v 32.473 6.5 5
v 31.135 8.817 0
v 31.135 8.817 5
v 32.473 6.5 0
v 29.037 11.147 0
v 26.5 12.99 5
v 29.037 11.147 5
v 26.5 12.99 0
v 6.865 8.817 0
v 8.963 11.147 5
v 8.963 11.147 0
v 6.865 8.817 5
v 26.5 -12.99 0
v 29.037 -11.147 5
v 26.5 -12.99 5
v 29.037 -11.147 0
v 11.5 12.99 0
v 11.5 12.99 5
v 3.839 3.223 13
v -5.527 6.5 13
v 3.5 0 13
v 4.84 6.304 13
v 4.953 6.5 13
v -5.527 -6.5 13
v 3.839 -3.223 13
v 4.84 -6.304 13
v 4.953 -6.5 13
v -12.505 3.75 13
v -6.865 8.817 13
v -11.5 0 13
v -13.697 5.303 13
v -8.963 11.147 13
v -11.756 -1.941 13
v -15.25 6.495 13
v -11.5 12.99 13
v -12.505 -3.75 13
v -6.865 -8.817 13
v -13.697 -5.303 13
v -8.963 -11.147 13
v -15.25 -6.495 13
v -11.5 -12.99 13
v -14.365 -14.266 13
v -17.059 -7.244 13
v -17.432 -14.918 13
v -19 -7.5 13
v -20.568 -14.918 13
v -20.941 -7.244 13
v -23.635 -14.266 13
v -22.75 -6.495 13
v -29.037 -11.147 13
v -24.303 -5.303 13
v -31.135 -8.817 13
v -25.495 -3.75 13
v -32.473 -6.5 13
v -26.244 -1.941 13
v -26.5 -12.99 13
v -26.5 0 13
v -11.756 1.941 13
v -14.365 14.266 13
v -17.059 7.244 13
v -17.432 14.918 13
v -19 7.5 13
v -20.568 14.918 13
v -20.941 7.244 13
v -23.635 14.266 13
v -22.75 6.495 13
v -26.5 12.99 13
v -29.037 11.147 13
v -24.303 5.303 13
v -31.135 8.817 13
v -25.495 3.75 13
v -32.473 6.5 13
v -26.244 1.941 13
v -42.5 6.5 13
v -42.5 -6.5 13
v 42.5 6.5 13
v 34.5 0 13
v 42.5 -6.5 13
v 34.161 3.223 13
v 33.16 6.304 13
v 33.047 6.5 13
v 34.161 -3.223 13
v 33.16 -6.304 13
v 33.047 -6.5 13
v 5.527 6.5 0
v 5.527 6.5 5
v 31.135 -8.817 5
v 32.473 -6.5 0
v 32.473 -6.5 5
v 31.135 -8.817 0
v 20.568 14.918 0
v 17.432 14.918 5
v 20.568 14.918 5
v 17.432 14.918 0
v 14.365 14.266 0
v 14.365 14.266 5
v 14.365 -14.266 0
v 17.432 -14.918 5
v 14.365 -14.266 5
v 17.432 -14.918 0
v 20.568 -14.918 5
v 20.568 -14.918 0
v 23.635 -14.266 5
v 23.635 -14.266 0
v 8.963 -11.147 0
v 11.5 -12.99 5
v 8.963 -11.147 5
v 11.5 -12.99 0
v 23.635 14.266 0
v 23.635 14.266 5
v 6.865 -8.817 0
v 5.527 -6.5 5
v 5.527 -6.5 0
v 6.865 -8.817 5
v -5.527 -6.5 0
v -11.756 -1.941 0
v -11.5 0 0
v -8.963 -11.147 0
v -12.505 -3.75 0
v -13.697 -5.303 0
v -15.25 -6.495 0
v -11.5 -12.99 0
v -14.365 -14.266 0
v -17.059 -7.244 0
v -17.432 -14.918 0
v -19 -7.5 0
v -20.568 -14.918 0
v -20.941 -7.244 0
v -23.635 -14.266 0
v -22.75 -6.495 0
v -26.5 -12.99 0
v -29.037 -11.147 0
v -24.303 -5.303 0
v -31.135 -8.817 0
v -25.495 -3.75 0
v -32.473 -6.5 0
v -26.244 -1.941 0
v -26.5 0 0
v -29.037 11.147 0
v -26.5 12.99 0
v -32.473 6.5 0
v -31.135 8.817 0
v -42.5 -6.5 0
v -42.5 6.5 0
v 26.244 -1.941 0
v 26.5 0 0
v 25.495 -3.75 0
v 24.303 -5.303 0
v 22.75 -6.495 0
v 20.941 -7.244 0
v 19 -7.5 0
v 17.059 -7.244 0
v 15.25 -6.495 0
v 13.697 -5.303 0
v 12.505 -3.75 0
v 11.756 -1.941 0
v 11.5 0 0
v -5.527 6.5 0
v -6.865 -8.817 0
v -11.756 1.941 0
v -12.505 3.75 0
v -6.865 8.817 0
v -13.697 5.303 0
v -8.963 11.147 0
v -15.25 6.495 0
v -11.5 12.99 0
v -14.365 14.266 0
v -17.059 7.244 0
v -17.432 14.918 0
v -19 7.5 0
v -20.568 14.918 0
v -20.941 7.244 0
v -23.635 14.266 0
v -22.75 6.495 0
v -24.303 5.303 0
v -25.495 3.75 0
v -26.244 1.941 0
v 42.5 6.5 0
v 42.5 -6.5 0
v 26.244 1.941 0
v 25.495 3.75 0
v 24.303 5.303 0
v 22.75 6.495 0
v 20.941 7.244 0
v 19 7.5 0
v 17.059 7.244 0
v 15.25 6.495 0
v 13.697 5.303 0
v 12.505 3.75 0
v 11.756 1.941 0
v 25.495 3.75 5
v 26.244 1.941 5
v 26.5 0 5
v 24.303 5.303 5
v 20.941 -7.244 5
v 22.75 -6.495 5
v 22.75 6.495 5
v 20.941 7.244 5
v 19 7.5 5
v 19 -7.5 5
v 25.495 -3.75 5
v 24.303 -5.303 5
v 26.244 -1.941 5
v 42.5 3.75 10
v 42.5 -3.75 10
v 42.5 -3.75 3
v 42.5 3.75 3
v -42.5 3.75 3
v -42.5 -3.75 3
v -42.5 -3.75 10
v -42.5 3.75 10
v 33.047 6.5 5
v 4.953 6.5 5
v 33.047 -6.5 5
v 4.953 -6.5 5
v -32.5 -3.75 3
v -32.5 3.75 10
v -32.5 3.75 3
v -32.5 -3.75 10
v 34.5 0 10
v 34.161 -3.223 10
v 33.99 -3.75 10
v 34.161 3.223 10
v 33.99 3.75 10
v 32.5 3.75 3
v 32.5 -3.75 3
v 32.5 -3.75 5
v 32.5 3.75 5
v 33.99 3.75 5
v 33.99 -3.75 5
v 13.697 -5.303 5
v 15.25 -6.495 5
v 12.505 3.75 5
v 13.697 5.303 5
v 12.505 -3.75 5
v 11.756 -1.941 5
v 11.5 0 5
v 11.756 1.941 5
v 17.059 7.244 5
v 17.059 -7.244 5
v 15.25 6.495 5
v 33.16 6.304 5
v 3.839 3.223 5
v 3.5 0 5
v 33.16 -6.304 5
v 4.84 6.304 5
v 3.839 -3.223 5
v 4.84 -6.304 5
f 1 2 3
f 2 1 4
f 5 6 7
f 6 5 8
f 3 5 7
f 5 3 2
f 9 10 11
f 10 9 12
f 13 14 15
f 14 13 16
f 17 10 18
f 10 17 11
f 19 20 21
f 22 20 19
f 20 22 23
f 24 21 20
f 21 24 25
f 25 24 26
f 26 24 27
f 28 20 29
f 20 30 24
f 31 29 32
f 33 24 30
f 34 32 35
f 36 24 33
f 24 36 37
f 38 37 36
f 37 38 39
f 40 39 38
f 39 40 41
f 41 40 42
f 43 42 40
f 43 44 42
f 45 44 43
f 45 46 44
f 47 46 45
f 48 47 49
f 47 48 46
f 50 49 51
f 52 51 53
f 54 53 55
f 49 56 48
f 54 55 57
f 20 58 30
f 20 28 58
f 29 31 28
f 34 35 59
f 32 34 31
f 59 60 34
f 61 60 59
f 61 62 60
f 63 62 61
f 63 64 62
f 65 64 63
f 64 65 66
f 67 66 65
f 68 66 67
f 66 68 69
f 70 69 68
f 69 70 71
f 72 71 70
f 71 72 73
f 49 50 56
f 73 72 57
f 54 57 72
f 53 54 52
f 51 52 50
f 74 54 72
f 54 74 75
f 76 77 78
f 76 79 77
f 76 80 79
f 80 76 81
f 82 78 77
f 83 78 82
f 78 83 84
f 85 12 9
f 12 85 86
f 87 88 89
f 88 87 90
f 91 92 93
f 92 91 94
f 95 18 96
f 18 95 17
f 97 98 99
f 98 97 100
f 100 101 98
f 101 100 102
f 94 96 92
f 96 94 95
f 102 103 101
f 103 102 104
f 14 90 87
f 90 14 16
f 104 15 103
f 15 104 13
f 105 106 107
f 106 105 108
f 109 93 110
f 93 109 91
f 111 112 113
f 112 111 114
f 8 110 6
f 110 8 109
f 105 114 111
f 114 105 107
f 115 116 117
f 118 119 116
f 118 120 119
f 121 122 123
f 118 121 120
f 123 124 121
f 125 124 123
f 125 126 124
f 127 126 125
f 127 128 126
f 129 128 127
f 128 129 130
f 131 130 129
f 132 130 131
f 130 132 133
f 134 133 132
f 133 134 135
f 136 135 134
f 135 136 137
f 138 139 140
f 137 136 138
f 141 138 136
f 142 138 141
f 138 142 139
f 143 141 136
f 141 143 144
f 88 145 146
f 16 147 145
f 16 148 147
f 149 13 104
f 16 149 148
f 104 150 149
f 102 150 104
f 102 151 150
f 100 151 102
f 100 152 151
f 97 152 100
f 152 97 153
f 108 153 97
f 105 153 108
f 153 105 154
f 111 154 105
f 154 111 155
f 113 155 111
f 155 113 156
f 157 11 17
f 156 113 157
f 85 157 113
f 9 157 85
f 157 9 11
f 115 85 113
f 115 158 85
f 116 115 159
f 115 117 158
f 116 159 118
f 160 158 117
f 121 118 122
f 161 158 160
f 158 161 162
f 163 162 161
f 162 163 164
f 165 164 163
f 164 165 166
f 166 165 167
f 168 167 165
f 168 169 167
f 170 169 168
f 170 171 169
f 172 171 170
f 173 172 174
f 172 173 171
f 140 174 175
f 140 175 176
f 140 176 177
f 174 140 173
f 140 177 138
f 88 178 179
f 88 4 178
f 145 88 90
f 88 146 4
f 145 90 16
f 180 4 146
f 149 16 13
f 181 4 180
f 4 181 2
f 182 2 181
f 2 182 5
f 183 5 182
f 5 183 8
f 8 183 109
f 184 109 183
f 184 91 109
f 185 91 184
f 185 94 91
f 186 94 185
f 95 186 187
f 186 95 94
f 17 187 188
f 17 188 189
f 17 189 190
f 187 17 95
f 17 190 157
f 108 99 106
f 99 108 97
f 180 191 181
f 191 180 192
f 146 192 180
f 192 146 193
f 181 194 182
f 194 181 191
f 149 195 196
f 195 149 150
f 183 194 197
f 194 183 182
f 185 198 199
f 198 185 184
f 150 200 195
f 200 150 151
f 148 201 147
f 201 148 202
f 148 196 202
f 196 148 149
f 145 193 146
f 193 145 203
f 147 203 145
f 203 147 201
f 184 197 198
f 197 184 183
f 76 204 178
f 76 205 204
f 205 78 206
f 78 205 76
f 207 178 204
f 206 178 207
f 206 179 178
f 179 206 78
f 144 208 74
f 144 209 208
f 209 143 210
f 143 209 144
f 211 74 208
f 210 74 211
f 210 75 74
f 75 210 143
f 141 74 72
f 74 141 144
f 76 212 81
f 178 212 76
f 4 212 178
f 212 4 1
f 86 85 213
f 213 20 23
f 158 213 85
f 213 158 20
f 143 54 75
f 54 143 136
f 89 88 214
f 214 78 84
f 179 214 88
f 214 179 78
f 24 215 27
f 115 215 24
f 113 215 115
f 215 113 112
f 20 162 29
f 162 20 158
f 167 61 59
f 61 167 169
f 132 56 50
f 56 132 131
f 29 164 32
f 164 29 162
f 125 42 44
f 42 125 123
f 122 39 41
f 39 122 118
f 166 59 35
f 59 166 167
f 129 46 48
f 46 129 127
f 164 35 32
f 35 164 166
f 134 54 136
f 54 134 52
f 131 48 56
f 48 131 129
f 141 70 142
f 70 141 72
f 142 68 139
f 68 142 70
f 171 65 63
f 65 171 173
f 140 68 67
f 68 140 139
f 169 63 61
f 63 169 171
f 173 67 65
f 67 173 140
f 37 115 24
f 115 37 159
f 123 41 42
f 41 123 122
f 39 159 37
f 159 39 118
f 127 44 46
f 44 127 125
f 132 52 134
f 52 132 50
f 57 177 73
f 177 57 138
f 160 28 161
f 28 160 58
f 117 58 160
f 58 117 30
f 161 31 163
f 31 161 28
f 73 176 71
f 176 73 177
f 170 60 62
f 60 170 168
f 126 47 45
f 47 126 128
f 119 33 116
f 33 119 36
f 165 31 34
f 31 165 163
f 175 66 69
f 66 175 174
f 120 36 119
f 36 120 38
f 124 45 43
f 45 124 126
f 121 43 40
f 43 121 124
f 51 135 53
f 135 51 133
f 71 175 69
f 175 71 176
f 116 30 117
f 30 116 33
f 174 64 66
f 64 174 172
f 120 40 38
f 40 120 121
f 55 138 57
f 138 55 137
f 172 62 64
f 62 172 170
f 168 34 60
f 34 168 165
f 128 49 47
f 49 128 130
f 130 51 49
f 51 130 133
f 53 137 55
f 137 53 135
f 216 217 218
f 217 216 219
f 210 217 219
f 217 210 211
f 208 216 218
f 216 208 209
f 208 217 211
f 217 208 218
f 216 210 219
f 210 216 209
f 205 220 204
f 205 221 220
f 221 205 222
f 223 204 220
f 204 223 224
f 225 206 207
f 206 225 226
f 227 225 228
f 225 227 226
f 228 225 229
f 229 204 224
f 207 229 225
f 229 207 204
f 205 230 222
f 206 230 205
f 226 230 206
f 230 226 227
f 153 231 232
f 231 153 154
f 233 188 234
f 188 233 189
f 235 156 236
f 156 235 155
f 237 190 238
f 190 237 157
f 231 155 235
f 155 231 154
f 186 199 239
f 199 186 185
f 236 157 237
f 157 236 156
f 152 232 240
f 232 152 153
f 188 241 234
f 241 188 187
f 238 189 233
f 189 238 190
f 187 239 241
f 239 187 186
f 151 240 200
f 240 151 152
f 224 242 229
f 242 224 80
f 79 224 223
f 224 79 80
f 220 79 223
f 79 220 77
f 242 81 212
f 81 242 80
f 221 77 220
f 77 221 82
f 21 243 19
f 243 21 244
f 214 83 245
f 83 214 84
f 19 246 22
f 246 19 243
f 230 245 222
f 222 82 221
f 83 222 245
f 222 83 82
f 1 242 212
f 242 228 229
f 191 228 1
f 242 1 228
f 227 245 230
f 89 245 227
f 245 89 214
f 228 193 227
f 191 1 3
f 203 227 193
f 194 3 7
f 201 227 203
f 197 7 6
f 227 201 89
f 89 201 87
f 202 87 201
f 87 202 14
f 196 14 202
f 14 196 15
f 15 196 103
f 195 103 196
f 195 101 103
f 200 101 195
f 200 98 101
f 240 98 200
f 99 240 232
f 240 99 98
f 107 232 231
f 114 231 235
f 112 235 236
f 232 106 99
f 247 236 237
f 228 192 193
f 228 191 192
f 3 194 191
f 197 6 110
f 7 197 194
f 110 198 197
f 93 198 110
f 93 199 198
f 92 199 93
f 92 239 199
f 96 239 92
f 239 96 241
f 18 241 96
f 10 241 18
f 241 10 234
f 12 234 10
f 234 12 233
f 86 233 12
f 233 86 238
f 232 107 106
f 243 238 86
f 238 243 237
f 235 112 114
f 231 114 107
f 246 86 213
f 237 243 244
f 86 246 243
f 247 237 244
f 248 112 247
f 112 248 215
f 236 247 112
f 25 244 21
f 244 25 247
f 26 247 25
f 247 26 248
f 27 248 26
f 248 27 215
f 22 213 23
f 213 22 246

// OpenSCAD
holder_length = 85;
holder_width = 13;
holder_height = 13;

gear_distance = 38;
gear_tab_diameter = 15;

brace_width = 7.5;
brace_height = 7;

crank_size = 8;
crank_length = 20;

//translate([0, 0, holder_height/2]) bottom();
translate([0, 0, holder_height/2]) top();
//translate([0, 0, crank_size/2]) crank();
//gear();

module gear() {
	difference() {
		union() {
			import_stl("gears.stl", convexity = 20);
			translate([0, 0, 3.75]) cube([30, 30, 7.5], center = true);
		}
		translate([0, 0, -1]) cylinder(5+1, gear_tab_diameter/2, gear_tab_diameter/2);
		translate([0, 0, 10]) cube([crank_size, crank_size, 20], center = true);
	}
}

module crank() {
	union() {
		cube([crank_length, crank_size, crank_size], center = true);
		translate([crank_length/2+crank_size/2, -crank_length*2/2+crank_size/2, 0]) {
			cube([crank_size, crank_length*2, crank_size], center = true);
			rotate([0, 90, 0]) {
				translate([0, -crank_length+crank_size/2, crank_length/2/2/2+crank_size/2]) {
					cylinder(crank_length, crank_size/2, crank_size/2, center = true, $fn=20);
				}
			}
		}
	}
}

module top() {
	difference() {
		bottom();
		translate([+gear_distance/2, 0, 0])
			cylinder(holder_height*2, gear_tab_diameter/2, gear_tab_diameter/2, center = true);
		translate([+gear_distance/2, 0, 5])
			cylinder(holder_height, gear_tab_diameter+0.5, gear_tab_diameter+0.5, center = true);
	}
}

module bottom() {
	difference() {
		union() {
			cube([holder_length, holder_width, holder_height], center= true);

			translate([-gear_distance/2, 0, 0])
				cylinder(holder_height, gear_tab_diameter, gear_tab_diameter, center = true);

			translate([+gear_distance/2, 0, 0]) {
				cylinder(holder_height, gear_tab_diameter, gear_tab_diameter, center = true);
				translate([0, 0, +3]) {
					cylinder(holder_height, gear_tab_diameter/2, gear_tab_diameter/2, center = true);
				}
			}
		}

		translate([-gear_distance/2, 0, 0])
			cylinder(holder_height+2, gear_tab_diameter/2, gear_tab_diameter/2, center = true);

		translate([-holder_length/2-5.5+10, 0, 0])
			cube([11, brace_width, brace_height], center = true);

		translate([+holder_length/2+5.5-10, 0, 0])
			cube([11, brace_width, brace_height], center = true);
	}
}
